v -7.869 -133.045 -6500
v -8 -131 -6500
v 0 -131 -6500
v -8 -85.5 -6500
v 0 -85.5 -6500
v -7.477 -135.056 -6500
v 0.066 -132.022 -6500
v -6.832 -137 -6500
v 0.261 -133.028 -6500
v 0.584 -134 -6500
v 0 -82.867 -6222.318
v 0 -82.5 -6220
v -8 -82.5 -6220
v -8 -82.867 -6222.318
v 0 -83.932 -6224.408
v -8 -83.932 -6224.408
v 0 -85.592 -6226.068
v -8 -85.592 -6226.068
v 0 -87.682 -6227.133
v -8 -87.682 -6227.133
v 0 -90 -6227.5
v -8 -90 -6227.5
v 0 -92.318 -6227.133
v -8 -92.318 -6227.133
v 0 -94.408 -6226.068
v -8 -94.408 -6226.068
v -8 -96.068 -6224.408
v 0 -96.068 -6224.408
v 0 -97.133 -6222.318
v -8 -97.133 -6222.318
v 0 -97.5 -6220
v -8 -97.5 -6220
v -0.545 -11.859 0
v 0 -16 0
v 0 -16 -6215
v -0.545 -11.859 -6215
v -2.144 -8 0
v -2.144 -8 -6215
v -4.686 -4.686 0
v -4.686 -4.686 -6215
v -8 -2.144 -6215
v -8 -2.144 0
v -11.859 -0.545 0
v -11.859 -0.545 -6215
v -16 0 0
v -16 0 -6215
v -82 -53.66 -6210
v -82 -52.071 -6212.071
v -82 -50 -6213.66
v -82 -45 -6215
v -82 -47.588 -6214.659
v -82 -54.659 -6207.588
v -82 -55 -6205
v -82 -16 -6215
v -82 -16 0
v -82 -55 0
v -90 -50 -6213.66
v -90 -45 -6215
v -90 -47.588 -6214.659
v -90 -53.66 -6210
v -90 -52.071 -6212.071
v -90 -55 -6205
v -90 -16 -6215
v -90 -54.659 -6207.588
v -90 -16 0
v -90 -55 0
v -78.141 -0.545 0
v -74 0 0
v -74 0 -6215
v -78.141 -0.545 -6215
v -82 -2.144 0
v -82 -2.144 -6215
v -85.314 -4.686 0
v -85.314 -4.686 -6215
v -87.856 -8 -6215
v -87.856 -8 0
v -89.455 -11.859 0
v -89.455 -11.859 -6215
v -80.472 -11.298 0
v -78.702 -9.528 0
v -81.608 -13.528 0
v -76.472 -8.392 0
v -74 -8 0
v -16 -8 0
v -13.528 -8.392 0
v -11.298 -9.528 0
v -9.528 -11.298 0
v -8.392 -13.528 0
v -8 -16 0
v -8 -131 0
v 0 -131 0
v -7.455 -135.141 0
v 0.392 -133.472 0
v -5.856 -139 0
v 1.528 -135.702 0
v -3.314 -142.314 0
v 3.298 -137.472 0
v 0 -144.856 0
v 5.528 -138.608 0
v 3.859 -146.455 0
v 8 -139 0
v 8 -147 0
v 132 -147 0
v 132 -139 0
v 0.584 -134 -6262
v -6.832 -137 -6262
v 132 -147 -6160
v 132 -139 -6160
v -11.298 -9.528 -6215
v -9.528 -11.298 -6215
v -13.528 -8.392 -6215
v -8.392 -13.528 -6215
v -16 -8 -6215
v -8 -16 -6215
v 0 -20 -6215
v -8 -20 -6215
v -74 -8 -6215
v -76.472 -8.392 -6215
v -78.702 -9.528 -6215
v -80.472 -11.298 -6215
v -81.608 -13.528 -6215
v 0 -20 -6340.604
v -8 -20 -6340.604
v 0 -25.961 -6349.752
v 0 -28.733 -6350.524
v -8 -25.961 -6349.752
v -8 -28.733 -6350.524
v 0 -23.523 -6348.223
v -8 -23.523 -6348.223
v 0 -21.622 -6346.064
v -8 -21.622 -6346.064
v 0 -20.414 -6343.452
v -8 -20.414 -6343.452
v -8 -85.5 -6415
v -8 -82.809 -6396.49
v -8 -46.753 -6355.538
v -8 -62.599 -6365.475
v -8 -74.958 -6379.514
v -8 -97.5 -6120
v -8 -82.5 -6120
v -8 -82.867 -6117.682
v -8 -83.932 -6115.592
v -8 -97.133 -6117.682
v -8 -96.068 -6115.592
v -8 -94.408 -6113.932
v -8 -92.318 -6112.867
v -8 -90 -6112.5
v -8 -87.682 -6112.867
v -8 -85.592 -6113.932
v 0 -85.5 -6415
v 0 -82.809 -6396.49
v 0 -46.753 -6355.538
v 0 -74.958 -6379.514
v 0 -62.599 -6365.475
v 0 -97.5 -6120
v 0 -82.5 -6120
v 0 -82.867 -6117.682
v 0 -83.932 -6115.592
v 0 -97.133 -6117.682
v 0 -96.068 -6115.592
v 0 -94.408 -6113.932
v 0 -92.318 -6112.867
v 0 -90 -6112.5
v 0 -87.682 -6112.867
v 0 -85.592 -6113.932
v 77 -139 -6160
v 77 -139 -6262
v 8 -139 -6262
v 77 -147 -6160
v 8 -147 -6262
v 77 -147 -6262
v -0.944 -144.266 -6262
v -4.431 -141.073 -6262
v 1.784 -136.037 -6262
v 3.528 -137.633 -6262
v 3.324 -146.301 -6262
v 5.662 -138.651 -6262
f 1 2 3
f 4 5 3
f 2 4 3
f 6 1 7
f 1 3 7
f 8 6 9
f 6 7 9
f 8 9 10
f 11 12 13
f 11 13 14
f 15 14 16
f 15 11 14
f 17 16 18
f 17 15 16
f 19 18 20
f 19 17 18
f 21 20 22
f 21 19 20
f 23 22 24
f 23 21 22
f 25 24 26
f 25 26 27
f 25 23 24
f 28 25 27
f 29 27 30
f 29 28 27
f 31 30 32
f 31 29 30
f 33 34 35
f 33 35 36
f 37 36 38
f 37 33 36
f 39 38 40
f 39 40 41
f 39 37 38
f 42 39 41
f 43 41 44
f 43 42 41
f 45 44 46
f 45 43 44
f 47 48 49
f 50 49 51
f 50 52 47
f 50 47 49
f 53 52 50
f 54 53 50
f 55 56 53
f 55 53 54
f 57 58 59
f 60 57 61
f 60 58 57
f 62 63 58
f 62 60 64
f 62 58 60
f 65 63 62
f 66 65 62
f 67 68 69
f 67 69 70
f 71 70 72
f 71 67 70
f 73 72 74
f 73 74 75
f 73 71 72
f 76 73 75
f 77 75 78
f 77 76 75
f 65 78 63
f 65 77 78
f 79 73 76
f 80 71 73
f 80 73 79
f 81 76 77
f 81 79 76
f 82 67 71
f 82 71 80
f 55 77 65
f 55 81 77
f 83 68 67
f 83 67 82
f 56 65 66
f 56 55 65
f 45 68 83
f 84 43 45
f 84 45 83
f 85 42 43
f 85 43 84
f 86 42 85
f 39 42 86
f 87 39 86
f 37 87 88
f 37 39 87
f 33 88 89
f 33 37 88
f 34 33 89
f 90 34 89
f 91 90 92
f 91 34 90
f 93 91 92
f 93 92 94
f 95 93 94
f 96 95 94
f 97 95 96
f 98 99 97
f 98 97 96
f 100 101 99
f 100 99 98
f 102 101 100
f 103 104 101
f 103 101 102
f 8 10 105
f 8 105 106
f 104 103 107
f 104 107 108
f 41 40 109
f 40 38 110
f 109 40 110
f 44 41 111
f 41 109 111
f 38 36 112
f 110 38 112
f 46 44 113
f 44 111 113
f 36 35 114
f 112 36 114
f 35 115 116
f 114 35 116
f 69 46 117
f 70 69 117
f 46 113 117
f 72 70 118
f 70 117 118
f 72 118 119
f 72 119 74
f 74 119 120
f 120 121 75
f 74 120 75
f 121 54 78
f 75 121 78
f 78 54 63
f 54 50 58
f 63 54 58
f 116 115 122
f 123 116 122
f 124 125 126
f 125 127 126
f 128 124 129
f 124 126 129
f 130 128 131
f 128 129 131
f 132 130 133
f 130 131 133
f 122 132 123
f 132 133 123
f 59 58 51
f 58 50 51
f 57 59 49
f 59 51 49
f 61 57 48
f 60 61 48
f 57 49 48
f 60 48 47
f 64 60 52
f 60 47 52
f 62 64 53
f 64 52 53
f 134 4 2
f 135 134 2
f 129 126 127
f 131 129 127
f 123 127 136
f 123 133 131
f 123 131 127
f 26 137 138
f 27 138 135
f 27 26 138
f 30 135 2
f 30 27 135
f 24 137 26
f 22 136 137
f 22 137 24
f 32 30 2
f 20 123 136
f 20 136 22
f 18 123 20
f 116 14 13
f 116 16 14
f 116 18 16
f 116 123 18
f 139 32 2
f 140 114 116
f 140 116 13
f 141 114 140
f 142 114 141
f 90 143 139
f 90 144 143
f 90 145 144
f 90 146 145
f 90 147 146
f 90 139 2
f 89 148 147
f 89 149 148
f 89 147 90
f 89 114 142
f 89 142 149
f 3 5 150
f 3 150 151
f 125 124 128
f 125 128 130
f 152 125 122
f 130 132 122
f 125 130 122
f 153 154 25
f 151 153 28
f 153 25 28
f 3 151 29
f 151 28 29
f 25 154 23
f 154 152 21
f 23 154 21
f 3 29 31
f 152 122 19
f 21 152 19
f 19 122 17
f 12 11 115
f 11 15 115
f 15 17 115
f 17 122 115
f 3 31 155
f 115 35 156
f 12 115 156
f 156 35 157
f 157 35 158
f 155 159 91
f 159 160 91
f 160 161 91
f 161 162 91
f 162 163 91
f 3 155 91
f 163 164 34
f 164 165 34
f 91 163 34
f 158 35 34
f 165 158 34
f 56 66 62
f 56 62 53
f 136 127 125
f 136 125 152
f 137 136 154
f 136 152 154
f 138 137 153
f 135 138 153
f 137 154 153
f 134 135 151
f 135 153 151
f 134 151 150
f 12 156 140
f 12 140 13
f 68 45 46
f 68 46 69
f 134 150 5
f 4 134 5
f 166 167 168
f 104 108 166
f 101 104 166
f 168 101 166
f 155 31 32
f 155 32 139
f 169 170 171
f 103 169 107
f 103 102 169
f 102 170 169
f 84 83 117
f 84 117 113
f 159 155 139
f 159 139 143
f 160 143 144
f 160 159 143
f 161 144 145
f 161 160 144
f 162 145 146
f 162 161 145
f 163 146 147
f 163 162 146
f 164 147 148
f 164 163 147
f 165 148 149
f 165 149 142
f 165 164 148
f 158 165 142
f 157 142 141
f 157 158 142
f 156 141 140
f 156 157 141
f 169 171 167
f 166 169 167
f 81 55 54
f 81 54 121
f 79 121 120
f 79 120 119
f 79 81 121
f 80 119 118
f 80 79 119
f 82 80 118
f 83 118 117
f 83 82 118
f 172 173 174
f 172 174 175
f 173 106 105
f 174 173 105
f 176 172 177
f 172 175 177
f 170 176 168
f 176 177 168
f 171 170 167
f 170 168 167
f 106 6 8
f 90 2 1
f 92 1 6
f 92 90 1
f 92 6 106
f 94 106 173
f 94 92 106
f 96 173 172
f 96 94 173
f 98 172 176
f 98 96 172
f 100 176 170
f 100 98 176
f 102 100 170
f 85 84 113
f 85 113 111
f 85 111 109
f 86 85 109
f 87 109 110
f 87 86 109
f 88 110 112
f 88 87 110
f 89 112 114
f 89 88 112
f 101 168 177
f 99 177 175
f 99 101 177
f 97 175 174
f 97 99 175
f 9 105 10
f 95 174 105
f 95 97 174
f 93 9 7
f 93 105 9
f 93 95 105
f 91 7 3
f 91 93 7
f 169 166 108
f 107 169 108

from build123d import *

# Parameters (mm, degrees)
SM_BASE_FLANGE_1_DEPTH           = 8
SM_EDGE_FLANGE_1_STRIP_W         = 48
SM_EDGE_FLANGE_1_STRIP_H         = 8
SM_EDGE_FLANGE_1_STRIP_CUT_DEPTH = 6215
SM_EDGE_FLANGE_1_DEPTH           = 6215
SM_EDGE_FLANGE_2_STRIP_W         = 48
SM_EDGE_FLANGE_2_STRIP_H         = 8
SM_EDGE_FLANGE_2_STRIP_CUT_DEPTH = 6215
SM_EDGE_FLANGE_2_DEPTH           = 6215
SM_EDGE_FLANGE_3_STRIP_W         = 48
SM_EDGE_FLANGE_3_STRIP_H         = 8
SM_EDGE_FLANGE_3_STRIP_CUT_DEPTH = 6500
SM_EDGE_FLANGE_3_DEPTH           = 6500
FILLET_1_R                       = 10
CUT_EXTRUDE_START                = -6500
CUT_EXTRUDE_3_DEPTH              = 238
CUT_EXTRUDE_START_2              = -6262
CUT_EXTRUDE_3_2_OUTLINE_W        = 55
CUT_EXTRUDE_3_2_OUTLINE_H        = 8
CUT_EXTRUDE_3_2_DEPTH            = 102


# Read off the part's stored shape, not the designer's step: 切除-拉伸3
# Sheet-metal steps are written as plain solids
with BuildPart() as part:
    # Sketch 1 → 基体-法兰1 (new body)
    with BuildSketch(Plane(origin=(0, 0, 0), x_dir=(0, 0, -1), z_dir=(1, 0, 0))):
        with BuildLine():
            Line((0, 0), (6215, 0))
            Line((6215, 0), (6215, -20))
            Line((6215, -20), (6350.001923105, -20))
            ThreePointArc((6350.001923105, -20), (6368.861621181, -66.284822813), (6415, -85.5))
            Line((6415, -85.5), (6500, -85.5))
            Line((6500, -85.5), (6500, -147))
            Line((6500, -147), (0, -147))
            Line((0, -147), (0, 0))
        make_face()
        with BuildLine():
            Line((6120, -82.5), (6220, -82.5))
            ThreePointArc((6220, -82.5), (6227.5, -90), (6220, -97.5))
            Line((6220, -97.5), (6120, -97.5))
            ThreePointArc((6120, -97.5), (6112.5, -90), (6120, -82.5))
        make_face(mode=Mode.SUBTRACT)
    extrude(amount=-SM_BASE_FLANGE_1_DEPTH)

    # 边线-法兰1 strip (across the edge) → 边线-法兰1 strip cut (cut)
    with BuildSketch(Plane(origin=(-8, 0, 0), x_dir=(0, -1, 0), z_dir=(0, 0, -1))):
        with Locations((-8, -4)):
            Rectangle(SM_EDGE_FLANGE_1_STRIP_W, SM_EDGE_FLANGE_1_STRIP_H)
    extrude(amount=SM_EDGE_FLANGE_1_STRIP_CUT_DEPTH, mode=Mode.SUBTRACT)

    # 边线-法兰1 section (across the edge) → 边线-法兰1 (add)
    with BuildSketch(Plane(origin=(-8, 0, 0), x_dir=(0, -1, 0), z_dir=(0, 0, -1))):
        with BuildLine():
            Line((0, 8), (0, 74))
            Line((0, 74), (8, 74))
            Line((8, 74), (8, 8))
            ThreePointArc((8, 8), (10.343145751, 2.343145751), (16, 0))
            Line((16, 0), (16, -8))
            ThreePointArc((16, -8), (4.686291501, -3.313708499), (0, 8))
        make_face()
    extrude(amount=SM_EDGE_FLANGE_1_DEPTH)

    # 边线-法兰2 strip (across the edge) → 边线-法兰2 strip cut (cut)
    with BuildSketch(Plane(origin=(-82, -8, 0), x_dir=(1, 0, 0), z_dir=(0, 0, -1))):
        with Locations((-16, -4)):
            Rectangle(SM_EDGE_FLANGE_2_STRIP_W, SM_EDGE_FLANGE_2_STRIP_H)
    extrude(amount=SM_EDGE_FLANGE_2_STRIP_CUT_DEPTH, mode=Mode.SUBTRACT)

    # 边线-法兰2 section (across the edge) → 边线-法兰2 (add)
    with BuildSketch(Plane(origin=(-82, -8, 0), x_dir=(1, 0, 0), z_dir=(0, 0, -1))):
        with BuildLine():
            Line((-8, 8), (-8, 47))
            Line((-8, 47), (0, 47))
            Line((0, 47), (0, 8))
            ThreePointArc((0, 8), (2.343145751, 2.343145751), (8, 0))
            Line((8, 0), (8, -8))
            ThreePointArc((8, -8), (-3.313708499, -3.313708499), (-8, 8))
        make_face()
    extrude(amount=SM_EDGE_FLANGE_2_DEPTH)

    # 边线-法兰3 strip (across the edge) → 边线-法兰3 strip cut (cut)
    with BuildSketch(Plane(origin=(0, -147, 0), x_dir=(0, 1, 0), z_dir=(0, 0, -1))):
        with Locations((-8, -4)):
            Rectangle(SM_EDGE_FLANGE_3_STRIP_W, SM_EDGE_FLANGE_3_STRIP_H)
    extrude(amount=SM_EDGE_FLANGE_3_STRIP_CUT_DEPTH, mode=Mode.SUBTRACT)

    # 边线-法兰3 section (across the edge) → 边线-法兰3 (add)
    with BuildSketch(Plane(origin=(0, -147, 0), x_dir=(0, 1, 0), z_dir=(0, 0, -1))):
        with BuildLine():
            Line((0, 8), (0, 132))
            Line((0, 132), (8, 132))
            Line((8, 132), (8, 8))
            ThreePointArc((8, 8), (10.343145751, 2.343145751), (16, 0))
            Line((16, 0), (16, -8))
            ThreePointArc((16, -8), (4.686291501, -3.313708499), (0, 8))
        make_face()
    extrude(amount=SM_EDGE_FLANGE_3_DEPTH)

    # 圆角1
    fillet_1_edges = [part.edges().sort_by_distance(p)[0] for p in [
        (-86, -55, -6215),
        (-4, -20, -6350.001923105),
    ]]
    fillet(fillet_1_edges, radius=FILLET_1_R)

    # 切除-拉伸3 outline → 切除-拉伸3 (cut)
    with BuildSketch(Plane.XY.offset(CUT_EXTRUDE_START)):
        with BuildLine():
            Line((8, -147), (132, -147))
            Line((132, -147), (132, -139))
            Line((132, -139), (8, -139))
            ThreePointArc((8, -139), (3.527864045, -137.63324958), (0.583801513, -134))
            Line((0.583801513, -134), (-6.832396974, -137))
            ThreePointArc((-6.832396974, -137), (-0.94427191, -144.266499161), (8, -147))
        make_face()
    extrude(amount=CUT_EXTRUDE_3_DEPTH, mode=Mode.SUBTRACT)

    # Cut-Extrude 3 2 outline → Cut-Extrude 3 2 (cut)
    with BuildSketch(Plane.XY.offset(CUT_EXTRUDE_START_2)):
        with Locations((104.5, -143)):
            Rectangle(CUT_EXTRUDE_3_2_OUTLINE_W, CUT_EXTRUDE_3_2_OUTLINE_H)
    extrude(amount=CUT_EXTRUDE_3_2_DEPTH, mode=Mode.SUBTRACT)


solid = part.part
